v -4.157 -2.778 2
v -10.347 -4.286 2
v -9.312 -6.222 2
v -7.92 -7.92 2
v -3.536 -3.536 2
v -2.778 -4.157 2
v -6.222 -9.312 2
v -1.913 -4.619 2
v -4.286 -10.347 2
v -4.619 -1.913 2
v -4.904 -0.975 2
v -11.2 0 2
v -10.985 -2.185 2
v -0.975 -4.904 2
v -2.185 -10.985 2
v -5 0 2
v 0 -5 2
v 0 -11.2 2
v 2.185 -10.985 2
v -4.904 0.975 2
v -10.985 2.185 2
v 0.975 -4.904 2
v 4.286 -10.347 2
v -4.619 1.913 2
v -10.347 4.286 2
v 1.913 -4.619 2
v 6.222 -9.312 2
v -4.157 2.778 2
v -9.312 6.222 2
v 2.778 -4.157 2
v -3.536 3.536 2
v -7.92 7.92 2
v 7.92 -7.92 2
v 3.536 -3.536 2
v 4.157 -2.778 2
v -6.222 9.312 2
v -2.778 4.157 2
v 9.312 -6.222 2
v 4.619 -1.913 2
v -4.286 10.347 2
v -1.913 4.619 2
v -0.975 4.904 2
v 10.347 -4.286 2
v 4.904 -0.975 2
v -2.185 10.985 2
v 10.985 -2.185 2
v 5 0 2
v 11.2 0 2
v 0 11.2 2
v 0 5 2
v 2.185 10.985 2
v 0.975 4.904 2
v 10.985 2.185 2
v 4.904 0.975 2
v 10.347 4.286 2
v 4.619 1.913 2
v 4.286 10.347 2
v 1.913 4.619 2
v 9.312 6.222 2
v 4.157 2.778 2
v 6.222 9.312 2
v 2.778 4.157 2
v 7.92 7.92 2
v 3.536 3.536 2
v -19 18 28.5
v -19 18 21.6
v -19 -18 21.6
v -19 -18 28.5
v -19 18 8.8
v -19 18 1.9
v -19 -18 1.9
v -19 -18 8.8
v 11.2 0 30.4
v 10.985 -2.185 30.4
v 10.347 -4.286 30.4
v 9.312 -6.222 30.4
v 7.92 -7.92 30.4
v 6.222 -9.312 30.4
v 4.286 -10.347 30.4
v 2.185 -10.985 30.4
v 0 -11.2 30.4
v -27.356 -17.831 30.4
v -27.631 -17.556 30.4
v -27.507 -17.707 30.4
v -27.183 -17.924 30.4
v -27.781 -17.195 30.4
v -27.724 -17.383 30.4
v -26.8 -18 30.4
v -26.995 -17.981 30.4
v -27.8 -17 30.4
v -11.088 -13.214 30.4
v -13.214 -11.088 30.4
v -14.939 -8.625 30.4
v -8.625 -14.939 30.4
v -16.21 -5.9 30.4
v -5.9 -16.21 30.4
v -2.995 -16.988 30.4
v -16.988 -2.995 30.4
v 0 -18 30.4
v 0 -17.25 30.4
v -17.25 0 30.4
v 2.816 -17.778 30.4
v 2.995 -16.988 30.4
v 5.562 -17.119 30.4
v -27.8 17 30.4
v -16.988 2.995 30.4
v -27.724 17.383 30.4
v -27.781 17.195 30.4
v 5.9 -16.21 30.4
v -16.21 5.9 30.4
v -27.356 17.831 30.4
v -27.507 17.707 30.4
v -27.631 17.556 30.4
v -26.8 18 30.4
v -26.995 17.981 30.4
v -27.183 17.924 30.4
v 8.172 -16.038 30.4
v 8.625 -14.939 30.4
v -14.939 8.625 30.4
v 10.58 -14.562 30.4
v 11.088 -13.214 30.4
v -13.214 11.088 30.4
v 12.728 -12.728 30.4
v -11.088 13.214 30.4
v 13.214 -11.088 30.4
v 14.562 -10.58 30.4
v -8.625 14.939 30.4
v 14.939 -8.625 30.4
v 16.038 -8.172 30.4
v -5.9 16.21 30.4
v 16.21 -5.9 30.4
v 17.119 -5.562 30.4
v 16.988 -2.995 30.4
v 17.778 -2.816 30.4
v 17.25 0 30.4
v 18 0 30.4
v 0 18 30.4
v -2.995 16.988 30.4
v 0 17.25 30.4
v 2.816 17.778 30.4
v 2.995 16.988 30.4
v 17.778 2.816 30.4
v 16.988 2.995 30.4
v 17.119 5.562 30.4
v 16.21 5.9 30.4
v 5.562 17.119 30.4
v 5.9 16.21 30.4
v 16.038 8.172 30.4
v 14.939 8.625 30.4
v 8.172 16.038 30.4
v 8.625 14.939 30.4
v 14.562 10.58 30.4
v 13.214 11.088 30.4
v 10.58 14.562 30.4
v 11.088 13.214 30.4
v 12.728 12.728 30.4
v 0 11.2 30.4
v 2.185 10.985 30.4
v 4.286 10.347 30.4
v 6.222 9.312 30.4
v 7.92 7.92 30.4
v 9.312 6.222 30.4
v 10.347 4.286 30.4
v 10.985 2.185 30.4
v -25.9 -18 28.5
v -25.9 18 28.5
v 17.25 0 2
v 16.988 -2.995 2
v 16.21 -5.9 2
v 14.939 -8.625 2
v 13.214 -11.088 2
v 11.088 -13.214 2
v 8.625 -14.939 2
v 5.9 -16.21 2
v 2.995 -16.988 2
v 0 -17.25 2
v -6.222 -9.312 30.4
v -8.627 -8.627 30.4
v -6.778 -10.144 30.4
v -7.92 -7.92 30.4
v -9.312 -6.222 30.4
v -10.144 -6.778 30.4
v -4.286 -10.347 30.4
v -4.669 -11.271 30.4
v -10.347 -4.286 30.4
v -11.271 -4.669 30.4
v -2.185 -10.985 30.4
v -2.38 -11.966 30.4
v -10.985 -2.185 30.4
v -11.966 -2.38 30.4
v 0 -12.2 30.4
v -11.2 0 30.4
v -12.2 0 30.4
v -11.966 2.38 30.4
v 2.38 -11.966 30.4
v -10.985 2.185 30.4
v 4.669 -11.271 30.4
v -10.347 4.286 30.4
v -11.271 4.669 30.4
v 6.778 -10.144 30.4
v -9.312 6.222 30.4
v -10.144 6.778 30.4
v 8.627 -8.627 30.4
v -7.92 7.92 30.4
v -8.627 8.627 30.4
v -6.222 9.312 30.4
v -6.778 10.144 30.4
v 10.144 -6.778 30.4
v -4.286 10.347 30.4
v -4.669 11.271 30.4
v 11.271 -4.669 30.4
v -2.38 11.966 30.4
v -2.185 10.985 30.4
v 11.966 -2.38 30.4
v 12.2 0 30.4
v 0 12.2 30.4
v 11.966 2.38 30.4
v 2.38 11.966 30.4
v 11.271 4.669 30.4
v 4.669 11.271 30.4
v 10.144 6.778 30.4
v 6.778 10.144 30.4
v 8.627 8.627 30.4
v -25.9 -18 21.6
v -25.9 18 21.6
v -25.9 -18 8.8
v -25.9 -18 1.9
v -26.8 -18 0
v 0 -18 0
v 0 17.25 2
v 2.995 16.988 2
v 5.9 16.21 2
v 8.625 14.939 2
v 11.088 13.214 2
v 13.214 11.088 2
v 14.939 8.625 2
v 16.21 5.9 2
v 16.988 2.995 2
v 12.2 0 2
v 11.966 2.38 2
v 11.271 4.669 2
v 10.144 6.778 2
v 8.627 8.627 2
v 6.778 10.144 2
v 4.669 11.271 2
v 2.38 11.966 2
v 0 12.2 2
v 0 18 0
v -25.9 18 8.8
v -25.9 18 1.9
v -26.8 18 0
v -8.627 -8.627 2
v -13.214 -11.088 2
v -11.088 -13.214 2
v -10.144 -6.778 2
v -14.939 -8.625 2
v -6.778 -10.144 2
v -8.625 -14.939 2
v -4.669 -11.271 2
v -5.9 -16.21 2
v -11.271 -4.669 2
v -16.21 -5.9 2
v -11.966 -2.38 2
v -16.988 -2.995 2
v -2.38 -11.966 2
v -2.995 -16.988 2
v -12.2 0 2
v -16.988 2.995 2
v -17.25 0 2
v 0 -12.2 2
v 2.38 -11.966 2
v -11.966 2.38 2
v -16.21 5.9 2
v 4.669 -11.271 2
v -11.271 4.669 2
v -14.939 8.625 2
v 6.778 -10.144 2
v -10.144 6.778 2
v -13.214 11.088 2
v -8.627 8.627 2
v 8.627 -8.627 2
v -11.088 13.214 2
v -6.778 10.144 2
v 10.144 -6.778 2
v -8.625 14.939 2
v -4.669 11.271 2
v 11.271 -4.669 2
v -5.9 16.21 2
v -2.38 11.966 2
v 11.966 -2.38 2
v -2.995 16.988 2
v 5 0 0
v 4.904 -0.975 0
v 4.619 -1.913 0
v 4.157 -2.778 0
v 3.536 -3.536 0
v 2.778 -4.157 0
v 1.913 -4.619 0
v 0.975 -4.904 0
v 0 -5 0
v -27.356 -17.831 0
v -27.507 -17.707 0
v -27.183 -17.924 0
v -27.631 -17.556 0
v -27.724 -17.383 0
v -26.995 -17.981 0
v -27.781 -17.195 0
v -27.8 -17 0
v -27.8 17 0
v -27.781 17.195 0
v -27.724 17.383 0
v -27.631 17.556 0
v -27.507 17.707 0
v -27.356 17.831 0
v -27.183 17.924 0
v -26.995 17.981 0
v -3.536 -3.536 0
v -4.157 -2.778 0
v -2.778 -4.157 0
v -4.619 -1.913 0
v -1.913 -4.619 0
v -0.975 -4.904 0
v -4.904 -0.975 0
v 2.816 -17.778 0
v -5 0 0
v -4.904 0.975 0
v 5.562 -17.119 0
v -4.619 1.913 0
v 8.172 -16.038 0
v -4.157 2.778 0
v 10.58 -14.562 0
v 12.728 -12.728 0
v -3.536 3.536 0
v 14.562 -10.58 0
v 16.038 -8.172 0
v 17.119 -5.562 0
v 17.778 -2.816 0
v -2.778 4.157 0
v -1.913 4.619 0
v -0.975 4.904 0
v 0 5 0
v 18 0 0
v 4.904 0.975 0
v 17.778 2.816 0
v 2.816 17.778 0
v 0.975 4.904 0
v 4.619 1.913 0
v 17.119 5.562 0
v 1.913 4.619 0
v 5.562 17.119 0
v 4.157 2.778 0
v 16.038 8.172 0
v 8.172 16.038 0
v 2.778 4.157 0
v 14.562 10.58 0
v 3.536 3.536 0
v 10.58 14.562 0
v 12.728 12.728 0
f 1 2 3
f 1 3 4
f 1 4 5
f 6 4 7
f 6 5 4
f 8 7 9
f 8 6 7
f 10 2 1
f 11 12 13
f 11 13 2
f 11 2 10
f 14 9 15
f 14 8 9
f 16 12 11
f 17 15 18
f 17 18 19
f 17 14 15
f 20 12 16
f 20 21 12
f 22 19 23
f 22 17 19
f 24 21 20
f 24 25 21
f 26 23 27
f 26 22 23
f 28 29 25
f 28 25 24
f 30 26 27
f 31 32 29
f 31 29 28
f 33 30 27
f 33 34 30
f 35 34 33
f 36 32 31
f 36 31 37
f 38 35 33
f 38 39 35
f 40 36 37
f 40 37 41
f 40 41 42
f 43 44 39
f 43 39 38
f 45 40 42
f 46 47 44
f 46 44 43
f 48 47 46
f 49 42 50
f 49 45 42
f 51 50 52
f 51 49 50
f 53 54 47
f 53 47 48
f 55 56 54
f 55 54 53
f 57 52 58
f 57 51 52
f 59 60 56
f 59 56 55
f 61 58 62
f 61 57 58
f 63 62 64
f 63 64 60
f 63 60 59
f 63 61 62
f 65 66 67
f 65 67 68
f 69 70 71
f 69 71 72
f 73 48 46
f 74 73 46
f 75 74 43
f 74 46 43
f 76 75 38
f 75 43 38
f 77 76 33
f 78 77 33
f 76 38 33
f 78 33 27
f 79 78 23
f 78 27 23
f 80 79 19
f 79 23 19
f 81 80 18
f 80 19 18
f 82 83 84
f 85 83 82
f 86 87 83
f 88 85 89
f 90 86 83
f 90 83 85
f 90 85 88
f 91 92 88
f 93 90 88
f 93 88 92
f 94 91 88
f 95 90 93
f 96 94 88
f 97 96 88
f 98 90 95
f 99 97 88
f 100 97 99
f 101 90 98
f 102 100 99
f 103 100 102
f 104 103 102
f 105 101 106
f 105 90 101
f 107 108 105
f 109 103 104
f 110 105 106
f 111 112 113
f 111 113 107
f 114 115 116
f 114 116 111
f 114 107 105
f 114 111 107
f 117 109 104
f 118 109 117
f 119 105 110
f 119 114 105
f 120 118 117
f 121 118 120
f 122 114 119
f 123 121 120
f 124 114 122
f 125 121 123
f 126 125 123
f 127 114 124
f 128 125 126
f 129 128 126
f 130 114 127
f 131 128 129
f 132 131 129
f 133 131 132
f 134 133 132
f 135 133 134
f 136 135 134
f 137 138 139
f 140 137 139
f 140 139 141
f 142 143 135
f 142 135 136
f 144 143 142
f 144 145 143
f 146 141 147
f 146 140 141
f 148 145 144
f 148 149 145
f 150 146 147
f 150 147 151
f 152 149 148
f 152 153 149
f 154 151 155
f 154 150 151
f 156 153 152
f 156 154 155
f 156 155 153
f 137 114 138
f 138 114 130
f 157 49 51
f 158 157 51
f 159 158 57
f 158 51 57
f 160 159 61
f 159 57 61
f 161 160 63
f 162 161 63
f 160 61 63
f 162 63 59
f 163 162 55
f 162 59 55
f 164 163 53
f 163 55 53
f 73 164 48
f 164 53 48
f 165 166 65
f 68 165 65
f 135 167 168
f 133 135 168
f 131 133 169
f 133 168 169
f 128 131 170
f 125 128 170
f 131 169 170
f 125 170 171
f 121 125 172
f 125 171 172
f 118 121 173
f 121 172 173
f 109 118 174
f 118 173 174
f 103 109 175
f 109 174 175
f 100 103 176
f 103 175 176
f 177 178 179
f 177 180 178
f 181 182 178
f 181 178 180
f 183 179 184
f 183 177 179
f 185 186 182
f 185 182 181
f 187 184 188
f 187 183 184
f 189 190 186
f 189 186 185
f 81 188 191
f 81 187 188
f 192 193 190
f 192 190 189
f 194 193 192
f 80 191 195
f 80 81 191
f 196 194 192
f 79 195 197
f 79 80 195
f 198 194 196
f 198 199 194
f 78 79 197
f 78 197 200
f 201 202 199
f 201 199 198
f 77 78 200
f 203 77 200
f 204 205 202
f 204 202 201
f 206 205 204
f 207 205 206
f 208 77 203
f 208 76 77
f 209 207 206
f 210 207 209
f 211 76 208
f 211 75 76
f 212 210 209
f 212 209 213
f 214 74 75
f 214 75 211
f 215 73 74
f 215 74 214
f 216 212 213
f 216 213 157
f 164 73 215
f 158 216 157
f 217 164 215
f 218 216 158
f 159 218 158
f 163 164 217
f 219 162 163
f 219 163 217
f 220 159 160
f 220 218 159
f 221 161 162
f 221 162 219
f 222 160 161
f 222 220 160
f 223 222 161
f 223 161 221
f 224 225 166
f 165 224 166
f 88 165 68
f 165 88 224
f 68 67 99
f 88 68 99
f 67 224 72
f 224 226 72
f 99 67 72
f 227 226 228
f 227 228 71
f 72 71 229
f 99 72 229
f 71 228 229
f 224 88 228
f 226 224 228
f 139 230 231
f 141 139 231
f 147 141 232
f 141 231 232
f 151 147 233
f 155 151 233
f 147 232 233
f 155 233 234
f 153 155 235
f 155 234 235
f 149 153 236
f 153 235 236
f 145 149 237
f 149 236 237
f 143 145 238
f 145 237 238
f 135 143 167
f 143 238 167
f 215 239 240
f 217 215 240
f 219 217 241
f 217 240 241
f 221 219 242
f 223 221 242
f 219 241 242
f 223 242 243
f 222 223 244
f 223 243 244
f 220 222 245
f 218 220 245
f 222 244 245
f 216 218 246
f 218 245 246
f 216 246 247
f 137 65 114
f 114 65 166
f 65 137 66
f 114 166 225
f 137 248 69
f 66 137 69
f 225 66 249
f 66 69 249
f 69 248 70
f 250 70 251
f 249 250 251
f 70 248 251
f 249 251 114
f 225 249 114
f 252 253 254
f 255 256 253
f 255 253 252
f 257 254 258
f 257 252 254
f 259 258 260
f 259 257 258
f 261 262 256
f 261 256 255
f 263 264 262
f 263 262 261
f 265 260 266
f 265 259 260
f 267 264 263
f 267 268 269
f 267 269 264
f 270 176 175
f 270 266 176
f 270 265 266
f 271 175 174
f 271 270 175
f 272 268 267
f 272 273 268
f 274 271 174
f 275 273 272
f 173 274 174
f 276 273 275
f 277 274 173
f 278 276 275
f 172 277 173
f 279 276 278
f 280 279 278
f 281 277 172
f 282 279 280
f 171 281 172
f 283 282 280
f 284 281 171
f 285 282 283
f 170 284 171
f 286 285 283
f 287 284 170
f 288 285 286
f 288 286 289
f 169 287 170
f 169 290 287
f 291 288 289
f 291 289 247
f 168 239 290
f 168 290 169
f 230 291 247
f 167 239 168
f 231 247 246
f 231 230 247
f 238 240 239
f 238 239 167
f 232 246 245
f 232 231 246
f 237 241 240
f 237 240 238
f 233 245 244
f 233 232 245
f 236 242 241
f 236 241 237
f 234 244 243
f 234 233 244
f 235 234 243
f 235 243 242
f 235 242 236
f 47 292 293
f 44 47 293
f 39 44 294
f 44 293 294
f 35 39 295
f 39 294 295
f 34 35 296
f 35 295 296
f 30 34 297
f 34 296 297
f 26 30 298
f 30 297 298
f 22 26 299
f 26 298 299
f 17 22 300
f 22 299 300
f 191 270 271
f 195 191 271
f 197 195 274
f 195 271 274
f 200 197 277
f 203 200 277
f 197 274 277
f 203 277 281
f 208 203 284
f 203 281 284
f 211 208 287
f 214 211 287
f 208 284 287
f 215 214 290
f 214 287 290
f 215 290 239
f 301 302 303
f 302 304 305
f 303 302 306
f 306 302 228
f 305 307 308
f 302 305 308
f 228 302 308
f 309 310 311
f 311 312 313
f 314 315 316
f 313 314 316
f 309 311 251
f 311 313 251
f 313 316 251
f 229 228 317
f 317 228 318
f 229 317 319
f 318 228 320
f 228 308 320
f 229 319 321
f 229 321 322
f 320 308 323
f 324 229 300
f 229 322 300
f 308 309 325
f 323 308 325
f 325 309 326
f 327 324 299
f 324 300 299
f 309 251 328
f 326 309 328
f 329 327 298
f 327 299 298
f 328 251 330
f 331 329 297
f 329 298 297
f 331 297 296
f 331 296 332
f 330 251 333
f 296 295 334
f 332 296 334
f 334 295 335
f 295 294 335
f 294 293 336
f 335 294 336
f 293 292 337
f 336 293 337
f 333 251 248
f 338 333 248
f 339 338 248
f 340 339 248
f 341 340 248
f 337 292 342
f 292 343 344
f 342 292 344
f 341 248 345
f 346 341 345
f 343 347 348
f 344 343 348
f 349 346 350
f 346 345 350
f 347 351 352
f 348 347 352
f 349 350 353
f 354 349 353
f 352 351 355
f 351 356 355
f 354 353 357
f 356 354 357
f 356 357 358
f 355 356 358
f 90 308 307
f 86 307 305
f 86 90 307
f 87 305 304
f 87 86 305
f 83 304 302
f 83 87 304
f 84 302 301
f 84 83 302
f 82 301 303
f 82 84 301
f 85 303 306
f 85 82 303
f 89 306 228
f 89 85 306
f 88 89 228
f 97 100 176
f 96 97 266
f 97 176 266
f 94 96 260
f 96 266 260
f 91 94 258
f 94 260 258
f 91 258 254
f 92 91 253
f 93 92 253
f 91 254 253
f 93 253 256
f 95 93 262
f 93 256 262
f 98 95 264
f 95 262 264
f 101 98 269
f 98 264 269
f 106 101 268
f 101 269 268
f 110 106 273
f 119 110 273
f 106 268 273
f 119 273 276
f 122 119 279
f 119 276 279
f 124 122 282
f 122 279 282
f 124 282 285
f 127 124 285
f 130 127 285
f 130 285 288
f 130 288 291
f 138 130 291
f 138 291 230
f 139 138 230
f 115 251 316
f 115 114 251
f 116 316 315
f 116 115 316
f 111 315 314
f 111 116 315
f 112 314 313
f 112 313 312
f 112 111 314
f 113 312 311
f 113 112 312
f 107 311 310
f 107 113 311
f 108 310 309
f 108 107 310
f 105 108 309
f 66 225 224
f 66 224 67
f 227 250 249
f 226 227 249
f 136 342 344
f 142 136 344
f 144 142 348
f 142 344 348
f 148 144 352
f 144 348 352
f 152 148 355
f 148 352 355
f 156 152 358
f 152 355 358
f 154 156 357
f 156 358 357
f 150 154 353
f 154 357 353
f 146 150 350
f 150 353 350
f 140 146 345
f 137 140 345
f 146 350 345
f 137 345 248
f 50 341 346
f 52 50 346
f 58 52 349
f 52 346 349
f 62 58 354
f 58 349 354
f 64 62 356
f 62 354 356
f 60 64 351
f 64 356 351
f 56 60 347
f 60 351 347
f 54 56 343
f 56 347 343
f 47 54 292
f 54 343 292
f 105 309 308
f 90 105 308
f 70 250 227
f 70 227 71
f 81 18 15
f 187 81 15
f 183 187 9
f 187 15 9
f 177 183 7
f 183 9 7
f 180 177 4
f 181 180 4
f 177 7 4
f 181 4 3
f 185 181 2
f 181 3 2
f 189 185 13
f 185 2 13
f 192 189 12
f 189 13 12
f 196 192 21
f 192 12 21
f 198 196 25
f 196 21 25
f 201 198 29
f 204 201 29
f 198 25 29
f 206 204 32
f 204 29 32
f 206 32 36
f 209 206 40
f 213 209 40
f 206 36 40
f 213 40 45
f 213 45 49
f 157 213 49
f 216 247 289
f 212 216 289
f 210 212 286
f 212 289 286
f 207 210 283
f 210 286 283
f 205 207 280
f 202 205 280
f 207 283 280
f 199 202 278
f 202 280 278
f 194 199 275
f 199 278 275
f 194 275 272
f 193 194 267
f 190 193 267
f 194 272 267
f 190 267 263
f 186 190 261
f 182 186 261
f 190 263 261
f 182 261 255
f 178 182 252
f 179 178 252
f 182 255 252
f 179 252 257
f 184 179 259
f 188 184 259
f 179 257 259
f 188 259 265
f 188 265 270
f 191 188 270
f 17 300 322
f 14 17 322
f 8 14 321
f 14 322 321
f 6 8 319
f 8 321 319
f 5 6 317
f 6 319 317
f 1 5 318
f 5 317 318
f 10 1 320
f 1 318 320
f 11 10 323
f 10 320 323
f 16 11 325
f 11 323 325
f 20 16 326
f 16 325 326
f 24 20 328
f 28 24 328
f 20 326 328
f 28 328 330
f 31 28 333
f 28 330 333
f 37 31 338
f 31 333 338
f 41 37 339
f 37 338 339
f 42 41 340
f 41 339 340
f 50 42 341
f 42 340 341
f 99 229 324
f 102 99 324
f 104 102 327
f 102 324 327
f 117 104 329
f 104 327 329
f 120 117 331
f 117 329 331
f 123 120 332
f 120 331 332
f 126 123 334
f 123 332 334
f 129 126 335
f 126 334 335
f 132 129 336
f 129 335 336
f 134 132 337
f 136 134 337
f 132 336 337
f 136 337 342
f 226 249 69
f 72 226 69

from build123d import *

# Parameters (mm, degrees)
F1_DEPTH = 30.4
F2_DEPTH = 2
F3_W     = 6.9
F3_H     = 6.9
F4_DEPTH = 50
F5_R     = 1
F6_DEPTH = 30.4


# Not quite as in the source:
# - a feature names something its author has since deleted; it is built from what else it names


with BuildPart() as f1:
    # F0 (on Top) → F1 (new body)
    with BuildSketch(Plane.XY):
        with BuildLine():
            ThreePointArc((0, -18), (-18, 0), (0, 18))
            Line((0, 18), (-27.8, 18))
            Line((-27.8, 18), (-27.8, -18))
            Line((-27.8, -18), (0, -18))
        make_face()
        with BuildLine():
            ThreePointArc((0, -17.25), (-17.25, 0), (0, 17.25))
            Line((0, 17.25), (0, 18))
            ThreePointArc((0, 18), (-18, 0), (0, -18))
            Line((0, -18), (0, -17.25))
        make_face()
        with BuildLine():
            ThreePointArc((0, 17.25), (12.1975919755, 12.1975919755), (17.25, 0))
            ThreePointArc((17.25, 0), (12.1975919755, -12.1975919755), (0, -17.25))
            Line((0, -17.25), (0, -18))
            ThreePointArc((0, -18), (12.7279220614, -12.7279220614), (18, 0))
            ThreePointArc((18, 0), (12.7279220614, 12.7279220614), (0, 18))
            Line((0, 18), (0, 17.25))
        make_face()
    extrude(amount=F1_DEPTH)

    # F0 (on Top) → F2 (join)
    with BuildSketch(Plane.XY):
        with BuildLine():
            ThreePointArc((0, -17.25), (12.1975919755, -12.1975919755), (17.25, 0))
            ThreePointArc((17.25, 0), (12.1975919755, 12.1975919755), (0, 17.25))
            Line((0, 17.25), (0, 12.2))
            ThreePointArc((0, 12.2), (8.6267027305, 8.6267027305), (12.2, 0))
            ThreePointArc((12.2, 0), (8.6267027305, -8.6267027305), (0, -12.2))
            Line((0, -12.2), (0, -17.25))
        make_face()
        with BuildLine():
            Line((0, 12.2), (0, 17.25))
            ThreePointArc((0, 17.25), (-17.25, 0), (0, -17.25))
            Line((0, -17.25), (0, -12.2))
            ThreePointArc((0, -12.2), (-12.2, 0), (0, 12.2))
        make_face()
    extrude(amount=F2_DEPTH)

    # F3 (on face) → F4 (cut)
    with BuildSketch(Plane.XZ.offset(18)):
        with Locations((-22.45, 25.05)):
            Rectangle(F3_W, F3_H)
        with Locations((-22.45, 5.35)):
            Rectangle(F3_W, F3_H)
    extrude(amount=-F4_DEPTH, mode=Mode.SUBTRACT)

    # F5
    f5_edges = [f1.edges().sort_by_distance(p)[0] for p in [
        (-27.8, 18, 15.2),
        (-27.8, -18, 15.2),
    ]]
    fillet(f5_edges, radius=F5_R)



with BuildPart() as f2:
    # F0 (on Top) → F2, piece 2 (new body)
    with BuildSketch(Plane.XY):
        with BuildLine():
            ThreePointArc((11.2, 0), (7.9195959493, 7.9195959493), (0, 11.2))
            Line((0, 11.2), (0, 5))
            ThreePointArc((0, 5), (3.5355339059, 3.5355339059), (5, 0))
            ThreePointArc((5, 0), (3.5355339059, -3.5355339059), (0, -5))
            Line((0, -5), (0, -11.2))
            ThreePointArc((0, -11.2), (7.9195959493, -7.9195959493), (11.2, 0))
        make_face()
        with BuildLine():
            Line((0, 5), (0, 11.2))
            ThreePointArc((0, 11.2), (-11.2, 0), (0, -11.2))
            Line((0, -11.2), (0, -5))
            ThreePointArc((0, -5), (-5, 0), (0, 5))
        make_face()
    extrude(amount=F2_DEPTH)


with BuildPart() as f1_1:
    add(f1.part)

    add(f2.part)  # F6 merges F2
    # F0 (on Top) → F6 (join, through all)
    with BuildSketch(Plane.XY):
        with BuildLine():
            ThreePointArc((12.2, 0), (8.6267027305, 8.6267027305), (0, 12.2))
            Line((0, 12.2), (0, 11.2))
            ThreePointArc((0, 11.2), (7.9195959493, 7.9195959493), (11.2, 0))
            ThreePointArc((11.2, 0), (7.9195959493, -7.9195959493), (0, -11.2))
            Line((0, -11.2), (0, -12.2))
            ThreePointArc((0, -12.2), (8.6267027305, -8.6267027305), (12.2, 0))
        make_face()
        with BuildLine():
            Line((0, 11.2), (0, 12.2))
            ThreePointArc((0, 12.2), (-12.2, 0), (0, -12.2))
            Line((0, -12.2), (0, -11.2))
            ThreePointArc((0, -11.2), (-11.2, 0), (0, 11.2))
        make_face()
    extrude(amount=F6_DEPTH)


solid = f1_1.part
